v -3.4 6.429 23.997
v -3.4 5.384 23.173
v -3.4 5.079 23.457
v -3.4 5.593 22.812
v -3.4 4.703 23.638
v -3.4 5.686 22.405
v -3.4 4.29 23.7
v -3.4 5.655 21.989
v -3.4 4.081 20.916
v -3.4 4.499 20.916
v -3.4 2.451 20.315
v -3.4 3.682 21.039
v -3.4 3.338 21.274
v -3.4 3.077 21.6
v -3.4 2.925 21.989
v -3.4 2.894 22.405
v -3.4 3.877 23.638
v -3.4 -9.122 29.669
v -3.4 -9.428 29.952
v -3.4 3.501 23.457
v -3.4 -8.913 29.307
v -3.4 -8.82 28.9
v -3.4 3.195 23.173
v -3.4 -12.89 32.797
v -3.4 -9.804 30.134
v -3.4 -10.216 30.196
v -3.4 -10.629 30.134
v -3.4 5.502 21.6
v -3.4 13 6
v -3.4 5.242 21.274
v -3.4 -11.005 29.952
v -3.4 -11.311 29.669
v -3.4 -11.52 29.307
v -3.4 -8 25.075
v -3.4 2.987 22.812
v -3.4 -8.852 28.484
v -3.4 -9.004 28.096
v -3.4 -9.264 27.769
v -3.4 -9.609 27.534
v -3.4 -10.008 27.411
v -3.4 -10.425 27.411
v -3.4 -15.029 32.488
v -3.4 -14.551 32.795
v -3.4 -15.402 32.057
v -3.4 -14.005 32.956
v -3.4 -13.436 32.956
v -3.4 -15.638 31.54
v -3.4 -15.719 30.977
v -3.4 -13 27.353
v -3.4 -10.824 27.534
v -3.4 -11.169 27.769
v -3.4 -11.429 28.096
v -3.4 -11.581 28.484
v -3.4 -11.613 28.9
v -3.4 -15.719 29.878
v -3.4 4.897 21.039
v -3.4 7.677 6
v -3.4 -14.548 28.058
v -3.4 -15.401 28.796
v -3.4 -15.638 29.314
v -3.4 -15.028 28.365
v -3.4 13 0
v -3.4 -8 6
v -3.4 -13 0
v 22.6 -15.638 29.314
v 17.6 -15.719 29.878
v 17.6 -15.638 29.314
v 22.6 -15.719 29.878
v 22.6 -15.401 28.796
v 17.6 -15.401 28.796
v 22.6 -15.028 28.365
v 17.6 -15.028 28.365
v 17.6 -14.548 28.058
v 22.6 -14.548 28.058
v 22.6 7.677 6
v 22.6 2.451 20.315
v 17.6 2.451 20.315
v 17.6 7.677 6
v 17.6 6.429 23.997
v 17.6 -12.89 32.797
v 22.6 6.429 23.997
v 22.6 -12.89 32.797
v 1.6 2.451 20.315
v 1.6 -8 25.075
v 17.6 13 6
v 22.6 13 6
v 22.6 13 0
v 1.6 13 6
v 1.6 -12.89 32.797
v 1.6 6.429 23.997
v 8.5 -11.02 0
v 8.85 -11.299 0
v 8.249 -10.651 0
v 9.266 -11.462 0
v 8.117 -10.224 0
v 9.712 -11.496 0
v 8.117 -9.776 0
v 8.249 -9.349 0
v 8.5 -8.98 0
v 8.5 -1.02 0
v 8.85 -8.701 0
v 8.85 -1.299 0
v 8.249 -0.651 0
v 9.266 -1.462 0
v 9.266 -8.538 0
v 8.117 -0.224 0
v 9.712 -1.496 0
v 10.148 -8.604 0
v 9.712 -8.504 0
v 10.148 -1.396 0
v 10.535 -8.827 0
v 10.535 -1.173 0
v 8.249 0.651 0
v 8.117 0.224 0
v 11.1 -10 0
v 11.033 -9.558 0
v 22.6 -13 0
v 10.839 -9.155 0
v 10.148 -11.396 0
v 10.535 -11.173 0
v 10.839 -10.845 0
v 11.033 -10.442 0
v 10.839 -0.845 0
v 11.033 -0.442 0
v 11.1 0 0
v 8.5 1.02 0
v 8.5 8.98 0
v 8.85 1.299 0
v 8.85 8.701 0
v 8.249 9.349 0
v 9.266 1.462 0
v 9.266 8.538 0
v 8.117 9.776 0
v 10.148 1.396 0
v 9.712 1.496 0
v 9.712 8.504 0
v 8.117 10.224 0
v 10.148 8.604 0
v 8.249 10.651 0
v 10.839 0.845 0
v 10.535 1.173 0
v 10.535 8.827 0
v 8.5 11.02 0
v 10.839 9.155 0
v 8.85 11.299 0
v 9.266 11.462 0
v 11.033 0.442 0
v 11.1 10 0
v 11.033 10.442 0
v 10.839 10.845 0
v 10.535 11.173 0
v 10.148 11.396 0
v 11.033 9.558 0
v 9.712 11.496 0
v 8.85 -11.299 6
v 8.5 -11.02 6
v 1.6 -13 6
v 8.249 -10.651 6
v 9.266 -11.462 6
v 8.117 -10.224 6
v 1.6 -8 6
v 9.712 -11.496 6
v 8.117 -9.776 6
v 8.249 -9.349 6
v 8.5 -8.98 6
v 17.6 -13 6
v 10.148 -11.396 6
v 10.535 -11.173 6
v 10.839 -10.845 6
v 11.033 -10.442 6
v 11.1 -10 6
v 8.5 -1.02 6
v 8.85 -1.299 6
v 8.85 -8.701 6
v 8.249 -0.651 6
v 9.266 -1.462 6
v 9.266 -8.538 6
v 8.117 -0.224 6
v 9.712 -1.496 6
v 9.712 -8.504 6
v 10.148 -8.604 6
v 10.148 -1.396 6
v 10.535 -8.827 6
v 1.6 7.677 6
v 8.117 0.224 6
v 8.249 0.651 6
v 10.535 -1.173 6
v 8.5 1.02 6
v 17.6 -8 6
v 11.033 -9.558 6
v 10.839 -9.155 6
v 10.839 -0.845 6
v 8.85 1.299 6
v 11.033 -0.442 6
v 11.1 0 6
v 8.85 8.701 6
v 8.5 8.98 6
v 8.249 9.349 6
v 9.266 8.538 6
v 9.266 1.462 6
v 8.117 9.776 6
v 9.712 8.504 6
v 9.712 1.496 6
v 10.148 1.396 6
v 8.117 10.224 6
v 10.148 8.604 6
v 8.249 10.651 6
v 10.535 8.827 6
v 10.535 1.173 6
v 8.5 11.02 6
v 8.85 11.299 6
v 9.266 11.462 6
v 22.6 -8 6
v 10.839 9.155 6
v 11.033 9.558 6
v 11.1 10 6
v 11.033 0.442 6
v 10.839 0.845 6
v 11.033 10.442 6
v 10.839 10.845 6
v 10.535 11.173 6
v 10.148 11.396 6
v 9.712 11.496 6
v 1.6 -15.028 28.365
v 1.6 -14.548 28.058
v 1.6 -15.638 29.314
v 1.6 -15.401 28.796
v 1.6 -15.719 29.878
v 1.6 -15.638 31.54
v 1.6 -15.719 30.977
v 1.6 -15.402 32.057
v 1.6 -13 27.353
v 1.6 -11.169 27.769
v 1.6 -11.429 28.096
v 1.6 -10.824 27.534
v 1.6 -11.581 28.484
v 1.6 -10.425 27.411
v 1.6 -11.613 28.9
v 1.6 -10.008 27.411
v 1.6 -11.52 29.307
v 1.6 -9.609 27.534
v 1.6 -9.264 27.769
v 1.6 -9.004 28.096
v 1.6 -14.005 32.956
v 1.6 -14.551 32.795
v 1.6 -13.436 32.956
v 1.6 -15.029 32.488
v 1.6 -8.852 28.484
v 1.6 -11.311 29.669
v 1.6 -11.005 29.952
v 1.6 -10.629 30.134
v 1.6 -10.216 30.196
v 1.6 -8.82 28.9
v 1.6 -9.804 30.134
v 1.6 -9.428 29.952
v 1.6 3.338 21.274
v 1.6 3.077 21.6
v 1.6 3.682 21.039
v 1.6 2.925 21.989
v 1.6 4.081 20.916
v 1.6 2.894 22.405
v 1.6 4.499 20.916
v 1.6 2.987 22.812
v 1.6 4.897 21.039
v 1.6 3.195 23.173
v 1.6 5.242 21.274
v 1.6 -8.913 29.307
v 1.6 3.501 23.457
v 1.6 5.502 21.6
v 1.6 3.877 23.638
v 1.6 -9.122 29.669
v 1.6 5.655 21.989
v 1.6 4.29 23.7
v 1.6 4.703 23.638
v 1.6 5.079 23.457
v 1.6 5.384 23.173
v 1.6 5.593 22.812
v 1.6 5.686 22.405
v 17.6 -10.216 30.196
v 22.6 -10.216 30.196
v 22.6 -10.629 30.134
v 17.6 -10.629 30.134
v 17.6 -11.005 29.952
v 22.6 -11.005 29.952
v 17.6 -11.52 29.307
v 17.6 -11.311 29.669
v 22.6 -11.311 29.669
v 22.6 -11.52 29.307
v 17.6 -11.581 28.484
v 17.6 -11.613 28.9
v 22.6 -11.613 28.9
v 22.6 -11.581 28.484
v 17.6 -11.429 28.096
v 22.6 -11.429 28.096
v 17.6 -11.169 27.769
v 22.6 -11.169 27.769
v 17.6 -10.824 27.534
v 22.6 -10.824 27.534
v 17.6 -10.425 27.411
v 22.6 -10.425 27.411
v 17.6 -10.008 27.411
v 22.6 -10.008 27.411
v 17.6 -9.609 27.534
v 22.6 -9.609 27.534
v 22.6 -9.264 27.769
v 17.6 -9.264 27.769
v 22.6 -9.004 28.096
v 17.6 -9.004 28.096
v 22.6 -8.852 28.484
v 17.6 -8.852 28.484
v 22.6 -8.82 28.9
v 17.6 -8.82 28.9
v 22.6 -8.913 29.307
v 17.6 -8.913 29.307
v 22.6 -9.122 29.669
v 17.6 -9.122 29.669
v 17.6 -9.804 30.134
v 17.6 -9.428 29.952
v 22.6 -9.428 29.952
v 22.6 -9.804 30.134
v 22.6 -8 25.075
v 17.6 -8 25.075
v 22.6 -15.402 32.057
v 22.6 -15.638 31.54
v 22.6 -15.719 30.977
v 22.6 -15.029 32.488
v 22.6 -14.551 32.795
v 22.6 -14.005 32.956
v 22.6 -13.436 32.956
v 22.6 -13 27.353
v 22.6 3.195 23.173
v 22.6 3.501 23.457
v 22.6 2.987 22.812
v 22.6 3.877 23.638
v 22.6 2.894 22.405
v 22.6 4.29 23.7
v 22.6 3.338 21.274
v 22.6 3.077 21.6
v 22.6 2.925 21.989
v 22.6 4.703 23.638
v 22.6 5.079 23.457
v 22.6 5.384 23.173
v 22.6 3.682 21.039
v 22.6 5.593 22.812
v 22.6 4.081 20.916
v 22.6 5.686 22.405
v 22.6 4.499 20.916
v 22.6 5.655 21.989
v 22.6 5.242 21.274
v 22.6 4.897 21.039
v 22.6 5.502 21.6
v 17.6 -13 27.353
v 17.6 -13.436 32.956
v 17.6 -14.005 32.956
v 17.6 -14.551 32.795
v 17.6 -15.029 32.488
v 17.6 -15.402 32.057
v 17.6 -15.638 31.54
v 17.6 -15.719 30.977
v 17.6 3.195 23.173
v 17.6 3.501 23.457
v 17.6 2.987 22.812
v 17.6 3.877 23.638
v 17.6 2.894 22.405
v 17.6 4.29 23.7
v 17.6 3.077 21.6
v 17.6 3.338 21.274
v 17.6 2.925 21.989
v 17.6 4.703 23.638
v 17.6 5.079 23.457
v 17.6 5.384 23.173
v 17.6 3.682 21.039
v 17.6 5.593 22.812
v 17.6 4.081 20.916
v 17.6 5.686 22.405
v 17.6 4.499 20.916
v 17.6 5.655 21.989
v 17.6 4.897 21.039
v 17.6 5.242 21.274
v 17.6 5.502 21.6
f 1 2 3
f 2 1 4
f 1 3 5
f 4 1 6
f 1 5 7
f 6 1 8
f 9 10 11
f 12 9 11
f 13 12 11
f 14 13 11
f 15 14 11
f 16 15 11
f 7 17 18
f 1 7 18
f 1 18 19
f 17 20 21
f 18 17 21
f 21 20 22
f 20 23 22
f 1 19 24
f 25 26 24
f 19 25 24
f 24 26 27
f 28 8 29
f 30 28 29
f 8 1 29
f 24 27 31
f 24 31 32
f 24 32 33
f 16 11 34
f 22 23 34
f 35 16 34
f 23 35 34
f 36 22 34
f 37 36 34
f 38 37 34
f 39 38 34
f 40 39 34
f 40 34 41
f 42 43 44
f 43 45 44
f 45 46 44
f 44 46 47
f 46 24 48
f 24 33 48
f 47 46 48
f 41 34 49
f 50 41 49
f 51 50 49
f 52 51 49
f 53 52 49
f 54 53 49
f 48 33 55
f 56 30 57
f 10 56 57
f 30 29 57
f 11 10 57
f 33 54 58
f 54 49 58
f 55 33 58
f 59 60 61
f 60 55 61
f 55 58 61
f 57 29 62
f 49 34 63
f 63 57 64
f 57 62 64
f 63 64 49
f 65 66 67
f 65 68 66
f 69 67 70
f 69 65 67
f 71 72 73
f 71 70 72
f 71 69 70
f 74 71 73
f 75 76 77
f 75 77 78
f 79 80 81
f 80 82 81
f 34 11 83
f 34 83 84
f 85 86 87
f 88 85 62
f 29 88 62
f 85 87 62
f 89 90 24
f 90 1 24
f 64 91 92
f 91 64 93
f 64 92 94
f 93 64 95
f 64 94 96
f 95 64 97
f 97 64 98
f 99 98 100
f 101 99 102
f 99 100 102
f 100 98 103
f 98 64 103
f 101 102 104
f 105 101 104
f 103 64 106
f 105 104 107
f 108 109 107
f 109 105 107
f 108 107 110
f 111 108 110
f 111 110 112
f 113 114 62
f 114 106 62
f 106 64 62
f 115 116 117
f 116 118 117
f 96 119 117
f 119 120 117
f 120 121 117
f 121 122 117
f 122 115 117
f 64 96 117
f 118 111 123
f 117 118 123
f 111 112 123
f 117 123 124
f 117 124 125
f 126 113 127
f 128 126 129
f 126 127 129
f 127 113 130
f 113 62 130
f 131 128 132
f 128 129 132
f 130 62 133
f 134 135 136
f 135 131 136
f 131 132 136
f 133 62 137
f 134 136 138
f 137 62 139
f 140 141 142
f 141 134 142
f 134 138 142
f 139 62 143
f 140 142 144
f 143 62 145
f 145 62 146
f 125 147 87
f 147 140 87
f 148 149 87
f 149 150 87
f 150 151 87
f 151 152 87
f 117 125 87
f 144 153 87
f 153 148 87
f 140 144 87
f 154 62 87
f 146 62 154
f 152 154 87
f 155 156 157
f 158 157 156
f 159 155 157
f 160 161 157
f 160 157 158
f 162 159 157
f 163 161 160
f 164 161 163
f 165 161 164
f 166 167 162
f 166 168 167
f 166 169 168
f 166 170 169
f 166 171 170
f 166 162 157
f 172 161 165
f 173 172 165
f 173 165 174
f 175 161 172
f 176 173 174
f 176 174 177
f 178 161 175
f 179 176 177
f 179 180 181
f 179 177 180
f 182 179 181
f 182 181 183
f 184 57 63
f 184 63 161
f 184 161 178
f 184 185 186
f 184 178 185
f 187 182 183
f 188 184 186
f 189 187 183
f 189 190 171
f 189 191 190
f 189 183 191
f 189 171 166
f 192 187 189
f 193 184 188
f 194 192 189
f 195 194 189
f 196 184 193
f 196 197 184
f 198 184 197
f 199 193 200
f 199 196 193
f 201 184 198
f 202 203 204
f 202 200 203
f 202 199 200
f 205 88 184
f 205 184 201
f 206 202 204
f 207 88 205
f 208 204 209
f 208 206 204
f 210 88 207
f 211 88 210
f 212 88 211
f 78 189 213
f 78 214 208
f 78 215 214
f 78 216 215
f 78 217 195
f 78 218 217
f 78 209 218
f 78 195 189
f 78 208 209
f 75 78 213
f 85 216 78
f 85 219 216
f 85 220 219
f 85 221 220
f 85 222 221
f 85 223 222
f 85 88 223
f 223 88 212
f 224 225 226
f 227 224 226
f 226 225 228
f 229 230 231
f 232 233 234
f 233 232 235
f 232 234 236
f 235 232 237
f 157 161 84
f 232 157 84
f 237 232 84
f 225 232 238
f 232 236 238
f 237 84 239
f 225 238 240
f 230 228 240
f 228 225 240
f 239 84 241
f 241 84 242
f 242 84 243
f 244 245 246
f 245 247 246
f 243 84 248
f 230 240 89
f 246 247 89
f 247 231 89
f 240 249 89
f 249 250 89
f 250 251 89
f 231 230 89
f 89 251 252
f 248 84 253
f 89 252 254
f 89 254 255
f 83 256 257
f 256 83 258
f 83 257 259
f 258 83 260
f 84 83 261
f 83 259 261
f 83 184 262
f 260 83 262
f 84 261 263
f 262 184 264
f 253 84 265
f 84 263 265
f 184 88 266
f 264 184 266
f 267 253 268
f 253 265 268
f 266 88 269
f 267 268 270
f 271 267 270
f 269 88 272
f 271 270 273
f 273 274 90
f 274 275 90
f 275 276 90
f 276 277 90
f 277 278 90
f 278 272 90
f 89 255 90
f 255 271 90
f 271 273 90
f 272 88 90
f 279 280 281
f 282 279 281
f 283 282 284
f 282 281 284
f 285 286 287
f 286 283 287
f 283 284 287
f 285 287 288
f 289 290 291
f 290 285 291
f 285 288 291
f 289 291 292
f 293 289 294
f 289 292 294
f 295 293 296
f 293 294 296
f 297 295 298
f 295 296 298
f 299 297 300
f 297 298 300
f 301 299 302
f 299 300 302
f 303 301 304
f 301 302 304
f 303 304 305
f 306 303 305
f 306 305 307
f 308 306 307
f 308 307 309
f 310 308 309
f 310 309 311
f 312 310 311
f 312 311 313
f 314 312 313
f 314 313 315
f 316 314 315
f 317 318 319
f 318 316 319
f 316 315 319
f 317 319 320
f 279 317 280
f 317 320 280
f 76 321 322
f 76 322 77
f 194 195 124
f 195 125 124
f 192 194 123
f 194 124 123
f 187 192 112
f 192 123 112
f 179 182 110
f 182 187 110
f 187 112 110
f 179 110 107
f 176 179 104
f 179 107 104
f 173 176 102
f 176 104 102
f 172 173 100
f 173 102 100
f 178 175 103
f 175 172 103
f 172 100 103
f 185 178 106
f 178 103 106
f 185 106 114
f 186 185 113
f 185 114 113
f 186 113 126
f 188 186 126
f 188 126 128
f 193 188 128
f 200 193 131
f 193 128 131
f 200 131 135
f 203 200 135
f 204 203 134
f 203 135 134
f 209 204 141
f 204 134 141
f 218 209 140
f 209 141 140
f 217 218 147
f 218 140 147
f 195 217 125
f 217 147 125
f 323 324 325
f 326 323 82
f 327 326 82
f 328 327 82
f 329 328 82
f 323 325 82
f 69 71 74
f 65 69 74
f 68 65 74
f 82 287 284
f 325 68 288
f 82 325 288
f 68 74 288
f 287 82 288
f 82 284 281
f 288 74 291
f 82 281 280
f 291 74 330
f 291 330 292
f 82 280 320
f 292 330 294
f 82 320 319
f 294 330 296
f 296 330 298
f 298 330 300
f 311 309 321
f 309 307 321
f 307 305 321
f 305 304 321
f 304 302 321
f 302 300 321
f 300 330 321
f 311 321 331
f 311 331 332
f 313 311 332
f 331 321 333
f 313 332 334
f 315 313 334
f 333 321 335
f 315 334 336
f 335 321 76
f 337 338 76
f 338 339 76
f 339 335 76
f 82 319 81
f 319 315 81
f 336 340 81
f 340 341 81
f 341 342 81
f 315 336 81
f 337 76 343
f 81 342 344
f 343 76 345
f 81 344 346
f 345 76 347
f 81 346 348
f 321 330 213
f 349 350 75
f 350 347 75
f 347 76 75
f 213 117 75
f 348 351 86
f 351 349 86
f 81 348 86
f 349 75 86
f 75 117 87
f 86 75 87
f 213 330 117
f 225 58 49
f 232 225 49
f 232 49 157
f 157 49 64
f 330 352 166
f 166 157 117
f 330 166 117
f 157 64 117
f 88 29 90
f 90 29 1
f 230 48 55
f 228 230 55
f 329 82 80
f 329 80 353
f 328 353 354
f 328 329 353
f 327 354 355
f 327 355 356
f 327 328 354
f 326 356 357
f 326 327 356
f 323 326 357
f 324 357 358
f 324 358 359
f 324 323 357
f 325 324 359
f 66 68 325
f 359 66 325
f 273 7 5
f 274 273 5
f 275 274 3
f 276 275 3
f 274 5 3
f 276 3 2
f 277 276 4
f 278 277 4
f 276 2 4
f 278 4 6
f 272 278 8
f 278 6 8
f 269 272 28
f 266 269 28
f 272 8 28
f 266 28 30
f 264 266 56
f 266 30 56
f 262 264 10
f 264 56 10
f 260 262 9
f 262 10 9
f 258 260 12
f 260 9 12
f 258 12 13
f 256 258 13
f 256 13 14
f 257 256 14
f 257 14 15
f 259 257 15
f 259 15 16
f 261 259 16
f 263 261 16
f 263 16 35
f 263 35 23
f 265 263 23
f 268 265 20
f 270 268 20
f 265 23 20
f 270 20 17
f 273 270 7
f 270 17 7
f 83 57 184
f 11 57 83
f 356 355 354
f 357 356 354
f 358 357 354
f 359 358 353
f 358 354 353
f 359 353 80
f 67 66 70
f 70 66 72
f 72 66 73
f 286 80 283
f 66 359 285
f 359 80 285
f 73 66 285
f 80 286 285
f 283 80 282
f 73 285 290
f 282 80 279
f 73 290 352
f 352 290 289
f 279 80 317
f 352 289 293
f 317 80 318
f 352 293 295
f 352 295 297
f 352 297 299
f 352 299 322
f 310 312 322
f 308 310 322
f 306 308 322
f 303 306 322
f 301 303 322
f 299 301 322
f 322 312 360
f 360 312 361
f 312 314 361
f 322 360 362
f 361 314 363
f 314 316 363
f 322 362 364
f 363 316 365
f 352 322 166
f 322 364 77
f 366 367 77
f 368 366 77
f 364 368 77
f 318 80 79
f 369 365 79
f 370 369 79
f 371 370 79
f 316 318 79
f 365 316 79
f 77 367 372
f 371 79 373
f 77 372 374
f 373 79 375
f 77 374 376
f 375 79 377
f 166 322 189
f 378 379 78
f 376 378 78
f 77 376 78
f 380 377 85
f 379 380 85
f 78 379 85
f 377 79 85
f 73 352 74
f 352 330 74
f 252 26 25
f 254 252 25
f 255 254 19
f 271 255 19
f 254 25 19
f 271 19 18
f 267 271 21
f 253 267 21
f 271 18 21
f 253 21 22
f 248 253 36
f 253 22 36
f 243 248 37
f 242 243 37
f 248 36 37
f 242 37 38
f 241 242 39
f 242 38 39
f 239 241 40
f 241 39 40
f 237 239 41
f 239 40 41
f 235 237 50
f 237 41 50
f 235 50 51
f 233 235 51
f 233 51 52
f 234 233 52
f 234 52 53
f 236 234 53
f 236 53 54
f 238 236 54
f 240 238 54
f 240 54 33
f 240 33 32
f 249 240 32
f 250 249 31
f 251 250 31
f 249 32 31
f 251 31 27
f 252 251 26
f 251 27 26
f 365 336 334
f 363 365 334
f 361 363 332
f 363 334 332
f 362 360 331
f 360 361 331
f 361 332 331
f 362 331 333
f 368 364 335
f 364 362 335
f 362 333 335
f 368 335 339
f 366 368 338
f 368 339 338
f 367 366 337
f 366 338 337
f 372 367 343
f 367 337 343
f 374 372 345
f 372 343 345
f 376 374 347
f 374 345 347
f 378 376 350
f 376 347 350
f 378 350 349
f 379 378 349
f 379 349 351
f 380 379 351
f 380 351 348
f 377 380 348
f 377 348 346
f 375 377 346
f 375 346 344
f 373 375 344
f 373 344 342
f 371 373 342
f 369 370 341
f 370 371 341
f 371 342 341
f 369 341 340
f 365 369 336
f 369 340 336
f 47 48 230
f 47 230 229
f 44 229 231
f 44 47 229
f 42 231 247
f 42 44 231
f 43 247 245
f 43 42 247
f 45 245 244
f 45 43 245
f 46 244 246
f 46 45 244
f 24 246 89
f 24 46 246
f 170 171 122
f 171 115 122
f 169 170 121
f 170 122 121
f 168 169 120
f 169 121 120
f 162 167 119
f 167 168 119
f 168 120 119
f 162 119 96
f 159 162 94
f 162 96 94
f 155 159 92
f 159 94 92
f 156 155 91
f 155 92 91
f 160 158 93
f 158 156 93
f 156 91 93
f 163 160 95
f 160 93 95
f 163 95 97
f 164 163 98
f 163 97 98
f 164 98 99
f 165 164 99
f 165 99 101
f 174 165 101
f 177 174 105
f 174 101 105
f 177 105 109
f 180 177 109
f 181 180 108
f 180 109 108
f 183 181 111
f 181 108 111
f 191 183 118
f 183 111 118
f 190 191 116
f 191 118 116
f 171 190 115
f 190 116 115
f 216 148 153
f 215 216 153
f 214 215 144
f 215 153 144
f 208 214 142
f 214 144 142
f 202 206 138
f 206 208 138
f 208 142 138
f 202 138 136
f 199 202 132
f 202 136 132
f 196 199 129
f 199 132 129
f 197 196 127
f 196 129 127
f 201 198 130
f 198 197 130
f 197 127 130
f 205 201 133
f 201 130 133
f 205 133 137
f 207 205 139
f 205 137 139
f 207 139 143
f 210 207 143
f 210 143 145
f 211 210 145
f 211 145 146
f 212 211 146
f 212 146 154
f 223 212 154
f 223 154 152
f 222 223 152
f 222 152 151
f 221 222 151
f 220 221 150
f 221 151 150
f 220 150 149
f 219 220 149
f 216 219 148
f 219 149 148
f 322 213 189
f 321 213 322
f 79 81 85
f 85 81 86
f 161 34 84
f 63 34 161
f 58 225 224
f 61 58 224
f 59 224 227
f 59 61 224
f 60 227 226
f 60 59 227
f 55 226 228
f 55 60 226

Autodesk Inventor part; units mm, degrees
ref_plane "YZ Plane" through (0, 0, 0) normal (1, 0, 0) x (0, 1, 0)
ref_plane "XZ Plane" through (0, 0, 0) normal (0, 1, 0) x (-1, 0, 0)
ref_plane "XY Plane" through (0, 0, 0) normal (0, 0, 1) x (1, 0, 0)
ref_plane "Arbeitsebene1" through (0, 0, 0) normal (0, 0, 1) x (1, 0, 0)
sketch "Skizze1" plane through (0, 0, 0) normal (0, 0, 1) x (1, 0, 0)
  circle A0 centre (19.6, 0) radius 1.5 projected
  circle A1 centre (9.6, 0) radius 1.5 projected
  circle A2 centre (-0.4, 0) radius 1.5 projected
  circle A3 centre (9.6, -10) radius 1.5 projected
  circle A4 centre (9.6, 10) radius 1.5 projected
  arc A5 (22.5, -8.5328) -> (22.5, -11.4672) centre (19.6, -10) ccw projected
  arc A6 (22.5, 11.4672) -> (17.6036, 7.4354) centre (19.6, 10) ccw projected
  line L0 (-3.3, 16.2) -> (-22.5, 16.2) projected
  line L1 (-22.5, 16.2) -> (-22.5, -16.2) projected
  line L2 (-22.5, -16.2) -> (22.5, -16.2) projected
  line L3 (22.5, -16.2) -> (22.5, -11.4672) projected
  circle A7 centre (-0.4, -10) radius 3.25 projected
  line L4 (-3.4, -13) -> (22.6, -13)
  line L5 (22.6, -13) -> (22.6, 13)
  line L6 (22.6, 13) -> (-3.4, 13)
  line L7 (-3.4, 13) -> (-3.4, -13)
  line L8 (-3.4, -13) -> (22.6, 13) construction
  line L9 (22.6, -13) -> (-3.4, 13) construction
  arc A8 (1.5964, 7.4354) -> (-2.3964, 7.4354) centre (-0.4, 10) ccw projected
  arc A9 (-2.3964, 7.4354) -> (1.5964, 7.4354) centre (-0.4, 4.8709) ccw projected
  arc A10 (-3.3, 23.4037) -> (-3.3, 26.3381) centre (-0.4, 24.8709) ccw projected
  line L10 (-3.3, 23.4037) -> (-3.3, 16.2) projected
  line L11 (22.5, -8.5328) -> (22.5, 3.4037) projected
  arc A11 (17.6036, 7.4354) -> (22.5, 3.4037) centre (19.6, 4.8709) ccw projected
  line L12 (22.5, 11.4672) -> (22.5, 23.4037) projected
  arc A12 (22.5, 26.3381) -> (22.5, 23.4037) centre (19.6, 24.8709) ccw projected
  line L13 (22.5, 26.3381) -> (22.5, 28.2) projected
  line L14 (22.5, 28.2) -> (-3.3, 28.2) projected
  line L15 (-3.3, 28.2) -> (-3.3, 26.3381) projected
  point P0 (0, 0)
  point P1 (22.5, 16.2)
  dimension "d0" = 26
  dimension "d1" = 26
extrude "Extrusion1" add sketch "Skizze1" along normal blind 6 contours L11 A11 A6 L6 L12 L5 L4 L3 A5 | A5 L4 A7 L7 A9 A8 L6 A6 A11 L11 | A5 L3 L4 | L4 A7 L7 | L4 L7 A7 | L6 L12 A6 | A8 A9 L7 L6 | A8 L7 L6 | L7 A8 A9
sketch "Skizze2" plane through (-3.4, -13, 0) normal (-1, 0, 0) x (0, 0, 1)
  line L0 (0, 26) -> (0, 0) projected
  line L1 (0, 0) -> (6, 0) projected
  line L2 (6, 26) -> (6, 0) projected
  line L3 (0, 26) -> (6, 26) projected
  line L4 (6, 26) -> (23.9972, 19.4291)
  line L5 (23.9972, 19.4291) -> (32.8468, 0)
  line L6 (32.8468, 0) -> (27.3526, 0)
  line L7 (6, 24.5) -> (6, 20.6772)
  line L8 (27.3526, 0) -> (6, 0)
  line L9 (6, 20.6772) -> (20.3151, 15.4507)
  line L10 (20.3151, 15.4507) -> (25.0752, 5)
  line L11 (25.0752, 5) -> (6, 5)
  line L12 (32.8468, 0) -> (32.7967, 0.1099)
  line L13 (30.9766, -2.7191) -> (29.8778, -2.7191)
  line L14 (28.0577, -1.5481) -> (27.3526, 0)
  arc A0 (30.9766, -2.7191) -> (32.7967, 0.1099) centre (30.9766, -0.7191) ccw
  arc A1 (28.0577, -1.5481) -> (29.8778, -2.7191) centre (29.8778, -0.7191) ccw
  circle A2 centre (28.7957, 2.7835) radius 1.4
  circle A3 centre (22.3001, 17.2899) radius 1.4
  point P0 (0, 13)
  point P1 (32.8429, 0)
  point P2 (32.7967, 0.1099)
  dimension "d4" = 5
  dimension "d6" = 5
  dimension "d7" = 5
  dimension "d8" = 0
  dimension "d9" = 2
  dimension "d12" = 2.8
  dimension "d13" = 2.8
extrude "Extrusion2" add sketch "Skizze2" against normal blind 5 contours L3 L2 L1 L0 | L4 L5 A0 L6 L8 L2 L11 L10 L9 | L6 A0 L13 A1 L14
ref_plane "Arbeitsebene2" through (9.6, -13, 0) normal (-1, 0, 0) x (0, 0, 1)
mirror "Spiegeln1" about plane through (9.6, -13, 0) normal (-1, 0, 0) of "Extrusion2"
properties part number "Gripper_linear_finger"
